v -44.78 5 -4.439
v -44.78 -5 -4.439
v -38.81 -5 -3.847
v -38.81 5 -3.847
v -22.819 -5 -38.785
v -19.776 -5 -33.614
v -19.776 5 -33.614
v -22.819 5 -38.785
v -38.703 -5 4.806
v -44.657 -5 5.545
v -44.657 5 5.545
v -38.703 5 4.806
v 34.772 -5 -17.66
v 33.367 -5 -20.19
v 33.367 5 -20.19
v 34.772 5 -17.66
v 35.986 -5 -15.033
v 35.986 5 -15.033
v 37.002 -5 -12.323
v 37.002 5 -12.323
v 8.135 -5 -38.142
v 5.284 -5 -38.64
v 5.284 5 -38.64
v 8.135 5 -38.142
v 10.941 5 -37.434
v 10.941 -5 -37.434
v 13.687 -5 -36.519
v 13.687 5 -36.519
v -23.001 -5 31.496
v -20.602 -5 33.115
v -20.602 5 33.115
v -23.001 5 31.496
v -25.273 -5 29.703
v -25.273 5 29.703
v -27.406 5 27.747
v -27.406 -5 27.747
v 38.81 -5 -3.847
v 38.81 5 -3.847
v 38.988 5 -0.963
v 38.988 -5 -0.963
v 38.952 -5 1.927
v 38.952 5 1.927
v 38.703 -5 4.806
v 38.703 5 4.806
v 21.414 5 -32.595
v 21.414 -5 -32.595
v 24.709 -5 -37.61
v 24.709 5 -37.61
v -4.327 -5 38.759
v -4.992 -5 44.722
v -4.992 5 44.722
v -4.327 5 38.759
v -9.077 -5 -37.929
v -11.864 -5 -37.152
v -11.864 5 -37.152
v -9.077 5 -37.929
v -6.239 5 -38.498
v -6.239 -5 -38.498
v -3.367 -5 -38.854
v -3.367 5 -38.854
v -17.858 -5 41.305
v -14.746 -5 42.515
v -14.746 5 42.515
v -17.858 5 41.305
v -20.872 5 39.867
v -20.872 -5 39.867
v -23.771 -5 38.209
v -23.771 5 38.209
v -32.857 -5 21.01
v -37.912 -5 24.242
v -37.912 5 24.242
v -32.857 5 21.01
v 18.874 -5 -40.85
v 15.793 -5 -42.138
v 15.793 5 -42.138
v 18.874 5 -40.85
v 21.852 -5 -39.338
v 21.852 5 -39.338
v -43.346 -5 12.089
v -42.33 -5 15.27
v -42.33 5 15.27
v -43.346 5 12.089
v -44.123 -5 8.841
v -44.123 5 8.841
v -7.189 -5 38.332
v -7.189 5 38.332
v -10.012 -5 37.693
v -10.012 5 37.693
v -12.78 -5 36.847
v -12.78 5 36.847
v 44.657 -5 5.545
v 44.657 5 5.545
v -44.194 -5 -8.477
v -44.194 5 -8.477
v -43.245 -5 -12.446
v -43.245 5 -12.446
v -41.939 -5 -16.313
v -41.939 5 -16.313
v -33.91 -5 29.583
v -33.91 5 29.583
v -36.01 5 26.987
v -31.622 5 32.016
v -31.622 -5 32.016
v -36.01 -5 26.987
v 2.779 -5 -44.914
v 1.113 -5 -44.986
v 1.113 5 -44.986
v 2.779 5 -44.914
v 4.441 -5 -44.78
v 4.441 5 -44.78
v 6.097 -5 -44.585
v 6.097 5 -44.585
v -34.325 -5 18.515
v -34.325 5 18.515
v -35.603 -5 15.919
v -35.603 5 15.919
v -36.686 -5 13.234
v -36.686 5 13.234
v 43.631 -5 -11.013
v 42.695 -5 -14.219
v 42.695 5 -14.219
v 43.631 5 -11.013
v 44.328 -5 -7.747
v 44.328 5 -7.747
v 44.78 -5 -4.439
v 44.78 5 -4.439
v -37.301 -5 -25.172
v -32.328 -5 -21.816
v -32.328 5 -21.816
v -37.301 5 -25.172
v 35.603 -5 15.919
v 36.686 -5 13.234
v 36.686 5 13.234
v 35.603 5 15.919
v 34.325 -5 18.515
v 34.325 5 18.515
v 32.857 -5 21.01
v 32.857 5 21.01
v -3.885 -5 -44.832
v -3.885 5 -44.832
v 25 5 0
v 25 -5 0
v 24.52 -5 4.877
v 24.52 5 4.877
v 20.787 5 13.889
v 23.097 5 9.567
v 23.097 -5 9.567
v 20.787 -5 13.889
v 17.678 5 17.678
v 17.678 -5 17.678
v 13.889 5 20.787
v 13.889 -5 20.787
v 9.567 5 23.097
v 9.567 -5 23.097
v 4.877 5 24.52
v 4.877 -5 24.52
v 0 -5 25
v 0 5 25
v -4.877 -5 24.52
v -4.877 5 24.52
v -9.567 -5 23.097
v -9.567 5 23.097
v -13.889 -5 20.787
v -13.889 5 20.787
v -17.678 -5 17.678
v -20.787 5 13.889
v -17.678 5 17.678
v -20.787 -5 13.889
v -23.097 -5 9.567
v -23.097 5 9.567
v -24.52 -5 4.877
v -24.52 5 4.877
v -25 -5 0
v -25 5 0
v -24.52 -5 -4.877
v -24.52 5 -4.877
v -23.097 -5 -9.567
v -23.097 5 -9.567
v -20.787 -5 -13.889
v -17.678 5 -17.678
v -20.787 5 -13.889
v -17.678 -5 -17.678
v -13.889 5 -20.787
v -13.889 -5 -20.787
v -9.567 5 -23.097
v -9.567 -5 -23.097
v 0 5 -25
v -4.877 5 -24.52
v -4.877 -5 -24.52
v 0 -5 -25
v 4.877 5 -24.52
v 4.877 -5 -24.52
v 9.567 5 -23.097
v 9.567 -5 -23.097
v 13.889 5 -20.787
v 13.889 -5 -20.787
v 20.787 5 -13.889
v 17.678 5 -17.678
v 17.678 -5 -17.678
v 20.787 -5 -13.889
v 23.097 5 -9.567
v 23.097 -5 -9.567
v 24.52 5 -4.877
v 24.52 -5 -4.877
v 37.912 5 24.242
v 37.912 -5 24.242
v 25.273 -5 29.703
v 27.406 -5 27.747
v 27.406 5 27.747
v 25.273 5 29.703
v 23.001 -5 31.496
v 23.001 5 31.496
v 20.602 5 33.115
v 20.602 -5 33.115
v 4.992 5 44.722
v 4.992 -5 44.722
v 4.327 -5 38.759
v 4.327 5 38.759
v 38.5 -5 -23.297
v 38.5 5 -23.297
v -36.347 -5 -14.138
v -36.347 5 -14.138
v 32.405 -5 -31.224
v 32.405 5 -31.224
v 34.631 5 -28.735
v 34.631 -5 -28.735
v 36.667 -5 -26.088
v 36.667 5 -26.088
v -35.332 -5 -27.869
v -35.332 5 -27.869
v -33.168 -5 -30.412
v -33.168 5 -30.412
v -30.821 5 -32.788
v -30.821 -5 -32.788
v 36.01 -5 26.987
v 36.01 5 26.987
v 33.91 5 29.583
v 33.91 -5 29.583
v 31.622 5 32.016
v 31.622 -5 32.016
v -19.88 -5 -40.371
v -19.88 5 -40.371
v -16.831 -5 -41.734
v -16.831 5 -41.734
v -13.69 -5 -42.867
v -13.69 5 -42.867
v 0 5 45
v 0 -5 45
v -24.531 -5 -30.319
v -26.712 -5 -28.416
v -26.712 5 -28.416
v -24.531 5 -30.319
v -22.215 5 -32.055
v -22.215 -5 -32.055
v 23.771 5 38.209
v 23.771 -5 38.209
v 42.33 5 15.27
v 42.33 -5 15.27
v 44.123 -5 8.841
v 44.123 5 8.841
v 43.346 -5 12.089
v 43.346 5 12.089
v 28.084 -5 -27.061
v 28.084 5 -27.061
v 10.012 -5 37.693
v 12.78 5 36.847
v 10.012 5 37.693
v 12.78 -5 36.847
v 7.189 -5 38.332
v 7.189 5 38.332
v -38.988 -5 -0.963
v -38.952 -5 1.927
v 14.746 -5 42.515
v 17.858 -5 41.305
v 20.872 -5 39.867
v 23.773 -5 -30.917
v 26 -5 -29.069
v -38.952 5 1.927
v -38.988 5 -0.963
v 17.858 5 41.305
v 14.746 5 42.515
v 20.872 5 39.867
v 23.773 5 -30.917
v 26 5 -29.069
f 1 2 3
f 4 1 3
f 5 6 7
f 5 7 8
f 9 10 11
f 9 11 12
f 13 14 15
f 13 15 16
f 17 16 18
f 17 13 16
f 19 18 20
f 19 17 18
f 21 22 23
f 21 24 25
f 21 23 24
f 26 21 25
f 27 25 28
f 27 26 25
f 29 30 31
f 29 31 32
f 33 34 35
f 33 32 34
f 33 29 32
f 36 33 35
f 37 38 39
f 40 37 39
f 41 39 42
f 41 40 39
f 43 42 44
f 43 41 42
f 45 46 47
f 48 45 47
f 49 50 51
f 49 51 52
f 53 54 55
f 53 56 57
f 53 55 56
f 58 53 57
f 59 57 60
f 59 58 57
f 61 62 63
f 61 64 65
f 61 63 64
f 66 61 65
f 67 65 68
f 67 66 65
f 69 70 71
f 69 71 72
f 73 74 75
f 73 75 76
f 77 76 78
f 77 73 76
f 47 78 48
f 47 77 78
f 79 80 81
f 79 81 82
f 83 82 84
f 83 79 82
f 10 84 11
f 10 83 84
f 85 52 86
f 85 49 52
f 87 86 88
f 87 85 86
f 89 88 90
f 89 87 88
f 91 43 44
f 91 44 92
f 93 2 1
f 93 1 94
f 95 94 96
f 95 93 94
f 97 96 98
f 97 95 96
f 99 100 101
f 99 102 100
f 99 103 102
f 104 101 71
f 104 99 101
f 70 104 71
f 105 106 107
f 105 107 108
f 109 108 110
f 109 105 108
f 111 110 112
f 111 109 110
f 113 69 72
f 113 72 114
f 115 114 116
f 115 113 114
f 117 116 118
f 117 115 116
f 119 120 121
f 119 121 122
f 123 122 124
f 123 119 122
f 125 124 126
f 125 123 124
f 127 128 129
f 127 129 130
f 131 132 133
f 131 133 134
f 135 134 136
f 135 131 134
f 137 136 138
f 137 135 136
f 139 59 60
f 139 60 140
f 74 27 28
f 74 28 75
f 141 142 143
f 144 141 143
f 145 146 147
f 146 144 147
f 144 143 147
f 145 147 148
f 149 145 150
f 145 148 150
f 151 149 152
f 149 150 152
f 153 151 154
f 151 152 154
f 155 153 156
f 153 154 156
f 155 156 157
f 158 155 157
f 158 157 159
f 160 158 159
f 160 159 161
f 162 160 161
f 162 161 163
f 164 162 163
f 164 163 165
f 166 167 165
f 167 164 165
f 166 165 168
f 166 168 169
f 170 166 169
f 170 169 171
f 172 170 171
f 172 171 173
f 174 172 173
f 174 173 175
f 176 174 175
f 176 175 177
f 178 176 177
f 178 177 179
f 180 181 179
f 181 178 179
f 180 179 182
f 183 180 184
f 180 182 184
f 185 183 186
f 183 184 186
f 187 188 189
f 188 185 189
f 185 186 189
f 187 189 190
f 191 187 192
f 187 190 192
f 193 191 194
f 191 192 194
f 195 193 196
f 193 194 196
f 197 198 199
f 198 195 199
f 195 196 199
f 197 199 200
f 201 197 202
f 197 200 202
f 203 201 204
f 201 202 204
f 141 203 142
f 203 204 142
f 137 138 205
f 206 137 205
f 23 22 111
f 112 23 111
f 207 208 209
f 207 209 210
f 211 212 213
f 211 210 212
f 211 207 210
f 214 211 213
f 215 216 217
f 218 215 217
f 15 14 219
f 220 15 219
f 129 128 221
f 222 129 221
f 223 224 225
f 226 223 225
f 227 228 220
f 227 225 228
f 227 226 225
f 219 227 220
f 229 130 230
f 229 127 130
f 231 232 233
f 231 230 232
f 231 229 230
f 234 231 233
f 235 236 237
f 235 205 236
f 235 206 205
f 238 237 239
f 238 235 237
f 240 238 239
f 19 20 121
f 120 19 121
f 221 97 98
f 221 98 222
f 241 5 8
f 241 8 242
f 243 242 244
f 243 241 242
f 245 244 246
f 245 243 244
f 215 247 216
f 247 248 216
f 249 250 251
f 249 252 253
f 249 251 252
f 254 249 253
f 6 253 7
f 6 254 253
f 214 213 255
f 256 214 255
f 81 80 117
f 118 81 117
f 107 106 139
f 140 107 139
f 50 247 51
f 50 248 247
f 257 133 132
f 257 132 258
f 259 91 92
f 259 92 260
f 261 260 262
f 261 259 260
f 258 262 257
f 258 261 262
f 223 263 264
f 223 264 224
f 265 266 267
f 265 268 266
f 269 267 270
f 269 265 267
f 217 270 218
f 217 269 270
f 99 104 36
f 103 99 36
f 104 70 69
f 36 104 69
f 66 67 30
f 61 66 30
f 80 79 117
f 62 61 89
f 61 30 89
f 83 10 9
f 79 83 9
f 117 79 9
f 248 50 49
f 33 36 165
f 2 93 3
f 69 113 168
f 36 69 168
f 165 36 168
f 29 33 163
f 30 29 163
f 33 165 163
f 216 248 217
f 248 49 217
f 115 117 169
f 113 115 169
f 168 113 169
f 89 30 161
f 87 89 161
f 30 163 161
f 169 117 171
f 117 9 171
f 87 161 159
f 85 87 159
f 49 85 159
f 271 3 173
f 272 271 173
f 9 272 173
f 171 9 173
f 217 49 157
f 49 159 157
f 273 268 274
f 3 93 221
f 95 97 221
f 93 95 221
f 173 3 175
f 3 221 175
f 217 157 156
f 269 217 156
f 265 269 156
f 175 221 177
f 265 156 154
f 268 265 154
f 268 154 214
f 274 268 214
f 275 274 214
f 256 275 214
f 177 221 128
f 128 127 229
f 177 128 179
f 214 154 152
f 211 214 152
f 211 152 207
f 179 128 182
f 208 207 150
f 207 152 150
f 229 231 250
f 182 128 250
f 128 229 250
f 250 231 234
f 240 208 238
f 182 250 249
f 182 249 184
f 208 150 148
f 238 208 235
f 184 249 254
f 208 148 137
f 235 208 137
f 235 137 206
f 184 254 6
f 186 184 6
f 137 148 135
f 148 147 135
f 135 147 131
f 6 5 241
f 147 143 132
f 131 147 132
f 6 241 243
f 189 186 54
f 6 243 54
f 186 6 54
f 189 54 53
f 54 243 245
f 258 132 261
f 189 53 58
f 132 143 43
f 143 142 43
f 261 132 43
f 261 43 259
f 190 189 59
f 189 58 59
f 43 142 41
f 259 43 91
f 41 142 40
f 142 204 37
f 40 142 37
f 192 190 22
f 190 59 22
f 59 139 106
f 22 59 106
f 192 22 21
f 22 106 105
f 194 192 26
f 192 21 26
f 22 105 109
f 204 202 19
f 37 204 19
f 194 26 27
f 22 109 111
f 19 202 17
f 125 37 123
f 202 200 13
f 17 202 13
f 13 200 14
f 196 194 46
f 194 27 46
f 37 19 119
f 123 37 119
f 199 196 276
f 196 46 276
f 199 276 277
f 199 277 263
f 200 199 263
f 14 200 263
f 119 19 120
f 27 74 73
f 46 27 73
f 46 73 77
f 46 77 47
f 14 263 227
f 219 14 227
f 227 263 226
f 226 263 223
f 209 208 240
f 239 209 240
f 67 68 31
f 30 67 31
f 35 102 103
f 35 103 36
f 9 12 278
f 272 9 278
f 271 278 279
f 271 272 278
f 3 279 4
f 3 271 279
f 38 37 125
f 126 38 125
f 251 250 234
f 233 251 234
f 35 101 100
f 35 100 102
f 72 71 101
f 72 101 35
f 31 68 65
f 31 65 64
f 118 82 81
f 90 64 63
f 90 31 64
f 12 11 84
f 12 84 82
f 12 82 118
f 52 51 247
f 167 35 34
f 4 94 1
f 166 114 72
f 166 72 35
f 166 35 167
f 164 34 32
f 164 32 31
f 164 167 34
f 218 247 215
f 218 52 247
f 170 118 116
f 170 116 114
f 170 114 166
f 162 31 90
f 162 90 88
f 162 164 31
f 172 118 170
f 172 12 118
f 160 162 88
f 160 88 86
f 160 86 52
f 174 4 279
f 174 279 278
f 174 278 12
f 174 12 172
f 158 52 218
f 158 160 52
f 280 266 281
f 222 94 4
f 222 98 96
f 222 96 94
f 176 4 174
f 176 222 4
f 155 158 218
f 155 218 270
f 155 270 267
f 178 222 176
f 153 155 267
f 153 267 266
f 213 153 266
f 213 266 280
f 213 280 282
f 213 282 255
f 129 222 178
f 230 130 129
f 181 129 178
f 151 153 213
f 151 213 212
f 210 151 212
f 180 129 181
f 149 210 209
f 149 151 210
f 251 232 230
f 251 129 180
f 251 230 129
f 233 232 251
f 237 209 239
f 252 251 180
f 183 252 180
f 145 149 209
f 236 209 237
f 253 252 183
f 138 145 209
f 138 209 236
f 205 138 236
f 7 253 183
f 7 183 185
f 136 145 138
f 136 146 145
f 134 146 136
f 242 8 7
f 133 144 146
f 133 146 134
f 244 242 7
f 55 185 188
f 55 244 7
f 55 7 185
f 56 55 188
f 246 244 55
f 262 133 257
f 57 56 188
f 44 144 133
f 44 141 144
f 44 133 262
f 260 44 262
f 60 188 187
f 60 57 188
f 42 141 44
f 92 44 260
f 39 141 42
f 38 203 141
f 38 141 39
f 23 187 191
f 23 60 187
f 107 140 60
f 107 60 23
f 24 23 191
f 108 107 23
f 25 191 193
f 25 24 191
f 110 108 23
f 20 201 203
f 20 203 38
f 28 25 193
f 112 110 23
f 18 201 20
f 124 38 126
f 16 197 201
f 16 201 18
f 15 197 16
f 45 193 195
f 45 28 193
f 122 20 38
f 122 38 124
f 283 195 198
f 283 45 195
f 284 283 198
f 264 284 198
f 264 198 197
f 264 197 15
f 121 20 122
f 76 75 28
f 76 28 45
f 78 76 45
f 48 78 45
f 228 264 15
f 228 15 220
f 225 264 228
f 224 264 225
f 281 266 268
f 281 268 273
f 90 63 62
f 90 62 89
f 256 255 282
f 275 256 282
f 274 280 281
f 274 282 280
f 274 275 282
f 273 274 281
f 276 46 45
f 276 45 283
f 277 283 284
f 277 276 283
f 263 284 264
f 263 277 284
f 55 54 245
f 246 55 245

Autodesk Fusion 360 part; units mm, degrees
sketch "Sketch1" plane through (0, 0, 0) normal (0, 1, 0) x (1, 0, 0)
  circle A0 centre (0, 0) radius 25
  line L0 (0, 0) -> (0, -72.8192) construction
  line L1 (0, -72.8192) -> (0, 0) construction
  line L2 (0, -45) -> (-4.9923, -44.7222)
  line L3 (-4.9923, -44.7222) -> (-4.3266, -38.7593)
  line L4 (-14.7457, -42.5154) -> (-12.7796, -36.8467)
  line L5 (-23.771, -38.2091) -> (-20.6016, -33.1146)
  line L6 (-31.6224, -32.016) -> (-27.4061, -27.7472)
  line L7 (-37.9122, -24.2417) -> (-32.8573, -21.0095)
  line L8 (-42.3298, -15.2704) -> (-36.6859, -13.2344)
  line L9 (-44.6571, -5.545) -> (-38.7028, -4.8057)
  line L10 (0, 0) -> (-2.7735, -24.8457) construction
  line L11 (-4.3266, -38.7593) -> (-4.9923, -44.7222) construction
  line L12 (0, 0) -> (-8.1921, -23.6197) construction
  line L13 (-12.7796, -36.8467) -> (-14.7457, -42.5154) construction
  line L14 (0, 0) -> (-13.2061, -21.2273) construction
  line L15 (-20.6016, -33.1146) -> (-23.771, -38.2091) construction
  line L16 (0, 0) -> (-17.568, -17.7866) construction
  line L17 (-27.4061, -27.7472) -> (-31.6224, -32.016) construction
  line L18 (0, 0) -> (-21.0624, -13.4676) construction
  line L19 (-32.8573, -21.0095) -> (-37.9122, -24.2417) construction
  line L20 (0, 0) -> (-23.5166, -8.4836) construction
  line L21 (-36.6859, -13.2344) -> (-42.3298, -15.2704) construction
  line L22 (0, 0) -> (-24.8095, -3.0805) construction
  line L23 (-38.7028, -4.8057) -> (-44.6571, -5.545) construction
  arc A1 (-23.771, -38.2091) -> (-14.7457, -42.5154) centre (0, 0) ccw
  arc A2 (-37.9122, -24.2417) -> (-31.6224, -32.016) centre (0, 0) ccw
  arc A3 (-36.6859, -13.2344) -> (-32.8573, -21.0095) centre (0, 0) ccw
  arc A4 (-27.4061, -27.7472) -> (-20.6016, -33.1146) centre (0, 0) ccw
  line L24 (-44.7805, 4.4388) -> (-38.8098, 3.847) construction
  line L25 (0, 0) -> (-24.8781, 2.466) construction
  line L26 (-38.8098, 3.847) -> (-44.7805, 4.4388) construction
  line L27 (-44.7805, 4.4388) -> (-38.8098, 3.847)
  arc A5 (-44.6571, -5.545) -> (-42.3298, -15.2704) centre (0, 0) ccw
  line L28 (0, -45) -> (4.9923, -44.7222)
  line L29 (0, 0) -> (4.9923, -44.7222) construction
  line L30 (4.9923, -44.7222) -> (4.3266, -38.7593)
  line L31 (0.0235, -39) -> (0, -45) construction
  line L32 (0.0235, -39) -> (0, -45)
  arc A6 (-12.7796, -36.8467) -> (-4.3266, -38.7593) centre (0, 0) ccw
  line L33 (0, 0) -> (67, 0) construction
  line L34 (0, 0) -> (0, 30) construction
  line L35 (65.5098, -16.7592) -> (65.5098, -18.6386)
  line L36 (0, 0) -> (14.7457, -42.5154) construction
  line L37 (0, 0) -> (23.771, -38.2091) construction
  line L38 (0, 0) -> (31.6224, -32.016) construction
  line L39 (0, 0) -> (37.9122, -24.2417) construction
  line L40 (0, 0) -> (42.3298, -15.2704) construction
  line L41 (0, 0) -> (44.6571, -5.545) construction
  line L42 (12.7796, -36.8467) -> (14.7457, -42.5154)
  line L43 (20.6016, -33.1146) -> (23.771, -38.2091)
  line L44 (27.4061, -27.7472) -> (31.6224, -32.016)
  line L45 (32.8573, -21.0095) -> (37.9122, -24.2417)
  line L46 (36.6859, -13.2344) -> (42.3298, -15.2704)
  line L47 (38.7028, -4.8057) -> (44.6571, -5.545)
  arc A7 (-4.9923, -44.7222) -> (4.9923, -44.7222) centre (0, 0) ccw
  line L48 (4.9923, -44.7222) -> (14.7457, -42.5154) construction
  arc A8 (14.7457, -42.5154) -> (23.771, -38.2091) centre (0, 0) ccw
  line L49 (23.771, -38.2091) -> (31.6224, -32.016) construction
  arc A9 (31.6224, -32.016) -> (37.9122, -24.2417) centre (0, 0) ccw
  line L50 (37.9122, -24.2417) -> (42.3298, -15.2704) construction
  arc A10 (4.3266, -38.7593) -> (12.7796, -36.8467) centre (0, 0) ccw
  line L51 (12.7796, -36.8467) -> (20.6016, -33.1146) construction
  arc A11 (20.6016, -33.1146) -> (27.4061, -27.7472) centre (0, 0) ccw
  line L52 (27.4061, -27.7472) -> (32.8573, -21.0095) construction
  arc A12 (32.8573, -21.0095) -> (36.6859, -13.2344) centre (0, 0) ccw
  line L53 (36.6859, -13.2344) -> (38.7028, -4.8057) construction
  line L54 (-38.7028, -4.8057) -> (-36.6859, -13.2344) construction
  line L55 (-32.8573, -21.0095) -> (-27.4061, -27.7472) construction
  line L56 (-20.6016, -33.1146) -> (-12.7796, -36.8467) construction
  line L57 (-4.3266, -38.7593) -> (4.3266, -38.7593) construction
  line L58 (44.9966, -0.5565) -> (44.9725, 0)
  line L59 (0, 0) -> (44.7805, 4.4388) construction
  line L60 (0, 0) -> (42.6946, 14.2188) construction
  line L61 (0, 0) -> (38.5002, 23.2967) construction
  line L62 (0, 0) -> (32.4046, 31.2241) construction
  line L63 (0, 0) -> (24.7088, 37.6095) construction
  line L64 (0, 0) -> (15.7927, 42.1377) construction
  line L65 (0, 0) -> (6.0968, 44.5851) construction
  line L66 (38.8098, 3.847) -> (44.7805, 4.4388)
  line L67 (37.0019, 12.323) -> (42.6946, 14.2188)
  line L68 (33.3668, 20.1904) -> (38.5002, 23.2967)
  line L69 (28.084, 27.0609) -> (32.4046, 31.2241)
  line L70 (21.4143, 32.5949) -> (24.7088, 37.6095)
  line L71 (13.687, 36.5194) -> (15.7927, 42.1377)
  line L72 (5.2839, 38.6404) -> (6.0968, 44.5851)
  arc A13 (42.3298, -15.2704) -> (44.6571, -5.545) centre (0, 0) ccw
  arc A14 (44.9966, -0.5565) -> (45, 0) centre (0, 0) ccw
  line L73 (44.6571, -5.545) -> (44.7805, 4.4388) construction
  arc A15 (44.7805, 4.4388) -> (42.6946, 14.2188) centre (0, 0) ccw
  line L74 (42.6946, 14.2188) -> (38.5002, 23.2967) construction
  arc A16 (38.5002, 23.2967) -> (32.4046, 31.2241) centre (0, 0) ccw
  line L75 (32.4046, 31.2241) -> (24.7088, 37.6095) construction
  arc A17 (24.7088, 37.6095) -> (15.7927, 42.1377) centre (0, 0) ccw
  line L76 (15.7927, 42.1377) -> (6.0968, 44.5851) construction
  line L77 (1.113, 44.9862) -> (-3.8847, 44.832)
  line L78 (0, 0) -> (-3.8847, 44.832) construction
  line L79 (0, 0) -> (-13.6897, 42.8671) construction
  line L80 (0, 0) -> (-22.8188, 38.7854) construction
  line L81 (0, 0) -> (-30.8209, 32.7883) construction
  line L82 (0, 0) -> (-37.3011, 25.172) construction
  line L83 (0, 0) -> (-41.9392, 16.3127) construction
  line L84 (-3.3667, 38.8544) -> (-3.8847, 44.832)
  line L85 (-11.8644, 37.1515) -> (-13.6897, 42.8671)
  line L86 (-19.7763, 33.614) -> (-22.8188, 38.7854)
  line L87 (-26.7115, 28.4165) -> (-30.8209, 32.7883)
  line L88 (-32.3276, 21.8157) -> (-37.3011, 25.172)
  line L89 (-41.9392, 16.3127) -> (-36.3473, 14.1376)
  arc A18 (6.0968, 44.5851) -> (-3.8847, 44.832) centre (0, 0) ccw
  line L90 (-3.8847, 44.832) -> (-13.6897, 42.8671) construction
  line L91 (-13.6897, 42.8671) -> (-11.8644, 37.1515) construction
  arc A19 (-13.6897, 42.8671) -> (-22.8188, 38.7854) centre (0, 0) ccw
  line L92 (-22.8188, 38.7854) -> (-30.8209, 32.7883) construction
  line L93 (-30.8209, 32.7883) -> (-26.7115, 28.4165) construction
  line L94 (-30.8209, 32.7883) -> (-26.7115, 28.4165)
  arc A20 (-30.8209, 32.7883) -> (-37.3011, 25.172) centre (0, 0) ccw
  arc A21 (-41.9392, 16.3127) -> (-44.7805, 4.4388) centre (0, 0) ccw
  line L95 (-37.3011, 25.172) -> (-41.9392, 16.3127) construction
  line L96 (-41.9392, 16.3127) -> (-36.3473, 14.1376)
  line L97 (-32.3276, 21.8157) -> (-37.3011, 25.172)
  arc A22 (38.7028, -4.8057) -> (38.8098, 3.847) centre (0, 0) ccw
  line L98 (38.8098, 3.847) -> (37.0019, 12.323) construction
  line L99 (24.7088, 37.6095) -> (21.4143, 32.5949)
  arc A23 (37.0019, 12.323) -> (33.3668, 20.1904) centre (0, 0) ccw
  line L100 (33.3668, 20.1904) -> (28.084, 27.0609) construction
  line L101 (38.5002, 23.2967) -> (33.3668, 20.1904)
  arc A24 (28.084, 27.0609) -> (21.4143, 32.5949) centre (0, 0) ccw
  line L102 (21.4143, 32.5949) -> (13.687, 36.5194) construction
  line L103 (13.687, 36.5194) -> (15.7927, 42.1377)
  arc A25 (13.687, 36.5194) -> (5.2839, 38.6404) centre (0, 0) ccw
  line L104 (5.2839, 38.6404) -> (-3.3667, 38.8544) construction
  line L105 (-3.3667, 38.8544) -> (-3.8847, 44.832)
  line L106 (-13.6897, 42.8671) -> (-11.8644, 37.1515)
  arc A26 (-3.3667, 38.8544) -> (-11.8644, 37.1515) centre (0, 0) ccw
  line L107 (-11.8644, 37.1515) -> (-19.7763, 33.614) construction
  line L108 (-22.8188, 38.7854) -> (-19.7763, 33.614)
  line L109 (-30.8209, 32.7883) -> (-26.7115, 28.4165)
  arc A27 (-19.7763, 33.614) -> (-26.7115, 28.4165) centre (0, 0) ccw
  line L110 (-26.7115, 28.4165) -> (-32.3276, 21.8157) construction
  line L111 (-37.3011, 25.172) -> (-32.3276, 21.8157)
  line L112 (-36.3473, 14.1376) -> (-41.9392, 16.3127)
  arc A28 (-32.3276, 21.8157) -> (-36.3473, 14.1376) centre (0, 0) ccw
  arc A29 (-38.8098, 3.847) -> (-38.7028, -4.8057) centre (0, 0) ccw
  line L113 (-38.8098, 3.847) -> (-36.3473, 14.1376) construction
  line L114 (-41.9392, 16.3127) -> (-36.3473, 14.1376)
  line L115 (-32.3276, 21.8157) -> (-36.3473, 14.1376)
  dimension "d1" = 90
  dimension "d2" = 78
  dimension "d3" = 50
  dimension "d4" = 5
  dimension "d5" = 10
  dimension "d6" = 10
  dimension "d7" = 10
  dimension "d8" = 10
  dimension "d9" = 10
  dimension "d10" = 10
  dimension "d13" = 12.739
  dimension "d14" = 5
  dimension "d15" = 10
  dimension "d16" = 10
  dimension "d17" = 10
  dimension "d18" = 10
  dimension "d19" = 10
  dimension "d20" = 10
  dimension "d21" = 5
  dimension "d22" = 5
  dimension "d23" = 10
  dimension "d24" = 10
  dimension "d25" = 10
  dimension "d26" = 10
  dimension "d27" = 10
  dimension "d28" = 10
  dimension "d29" = 5
  dimension "d30" = 5
  dimension "d31" = 10
  dimension "d32" = 10
  dimension "d33" = 10
  dimension "d34" = 10
  dimension "d35" = 10
extrude "Extrude1" add sketch "Sketch1" along normal mid plane 10 contours L2 L3 L4 L5 L6 L7 L8 L9 A1 A2 A3 A4 L27 A5 L28 L30 A6 L42 L43 L44 L45 L46 L47 A8 A9 A10 A11 A12 L66 L67 L68 L69 L70 L71 L72 A13 A15 A16 A17 L77 L84 L85 L86 L87 L88 L89 A18 A19 L94 A20 A21 L96 L97 A22 L99 A23 L101 A24 L103 A25 L105 L106 A26 L108 L109 A27 L111 L112 A29 L114 L115
